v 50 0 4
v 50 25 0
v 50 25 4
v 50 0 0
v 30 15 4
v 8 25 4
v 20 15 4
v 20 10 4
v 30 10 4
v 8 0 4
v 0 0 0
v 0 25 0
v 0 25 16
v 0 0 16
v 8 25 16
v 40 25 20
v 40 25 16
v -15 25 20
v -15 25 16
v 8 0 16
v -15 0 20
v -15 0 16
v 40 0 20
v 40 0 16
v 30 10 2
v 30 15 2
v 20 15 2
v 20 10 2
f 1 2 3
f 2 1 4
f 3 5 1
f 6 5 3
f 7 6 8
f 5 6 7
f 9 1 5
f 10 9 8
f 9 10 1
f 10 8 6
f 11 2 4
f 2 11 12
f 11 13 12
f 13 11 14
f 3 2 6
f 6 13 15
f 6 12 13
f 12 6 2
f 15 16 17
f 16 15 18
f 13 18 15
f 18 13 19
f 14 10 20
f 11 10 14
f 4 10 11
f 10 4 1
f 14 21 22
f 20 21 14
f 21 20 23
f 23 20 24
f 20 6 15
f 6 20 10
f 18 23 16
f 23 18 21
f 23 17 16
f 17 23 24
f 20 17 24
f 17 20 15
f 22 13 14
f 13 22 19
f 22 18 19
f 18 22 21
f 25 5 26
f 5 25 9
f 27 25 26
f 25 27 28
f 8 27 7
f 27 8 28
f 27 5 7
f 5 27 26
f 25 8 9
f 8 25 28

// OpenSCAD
// Eval fixture for 3d-print-doctor: a shelf bracket that needs supports both on the part and on the bed.
difference() {
  union() {
    cube([50, 25, 4]);                       // base
    cube([8, 25, 20]);                       // thick wall: has sparse infill
    translate([0, 0, 16]) cube([40, 25, 4]); // shelf over the base: supports stand on the part
    translate([-15, 0, 16]) cube([15, 25, 4]); // shelf past the base: supports from the bed
  }
  translate([20, 10, 2]) cube([10, 5, 3]);    // notch under the shelf: support wedges into it
}
